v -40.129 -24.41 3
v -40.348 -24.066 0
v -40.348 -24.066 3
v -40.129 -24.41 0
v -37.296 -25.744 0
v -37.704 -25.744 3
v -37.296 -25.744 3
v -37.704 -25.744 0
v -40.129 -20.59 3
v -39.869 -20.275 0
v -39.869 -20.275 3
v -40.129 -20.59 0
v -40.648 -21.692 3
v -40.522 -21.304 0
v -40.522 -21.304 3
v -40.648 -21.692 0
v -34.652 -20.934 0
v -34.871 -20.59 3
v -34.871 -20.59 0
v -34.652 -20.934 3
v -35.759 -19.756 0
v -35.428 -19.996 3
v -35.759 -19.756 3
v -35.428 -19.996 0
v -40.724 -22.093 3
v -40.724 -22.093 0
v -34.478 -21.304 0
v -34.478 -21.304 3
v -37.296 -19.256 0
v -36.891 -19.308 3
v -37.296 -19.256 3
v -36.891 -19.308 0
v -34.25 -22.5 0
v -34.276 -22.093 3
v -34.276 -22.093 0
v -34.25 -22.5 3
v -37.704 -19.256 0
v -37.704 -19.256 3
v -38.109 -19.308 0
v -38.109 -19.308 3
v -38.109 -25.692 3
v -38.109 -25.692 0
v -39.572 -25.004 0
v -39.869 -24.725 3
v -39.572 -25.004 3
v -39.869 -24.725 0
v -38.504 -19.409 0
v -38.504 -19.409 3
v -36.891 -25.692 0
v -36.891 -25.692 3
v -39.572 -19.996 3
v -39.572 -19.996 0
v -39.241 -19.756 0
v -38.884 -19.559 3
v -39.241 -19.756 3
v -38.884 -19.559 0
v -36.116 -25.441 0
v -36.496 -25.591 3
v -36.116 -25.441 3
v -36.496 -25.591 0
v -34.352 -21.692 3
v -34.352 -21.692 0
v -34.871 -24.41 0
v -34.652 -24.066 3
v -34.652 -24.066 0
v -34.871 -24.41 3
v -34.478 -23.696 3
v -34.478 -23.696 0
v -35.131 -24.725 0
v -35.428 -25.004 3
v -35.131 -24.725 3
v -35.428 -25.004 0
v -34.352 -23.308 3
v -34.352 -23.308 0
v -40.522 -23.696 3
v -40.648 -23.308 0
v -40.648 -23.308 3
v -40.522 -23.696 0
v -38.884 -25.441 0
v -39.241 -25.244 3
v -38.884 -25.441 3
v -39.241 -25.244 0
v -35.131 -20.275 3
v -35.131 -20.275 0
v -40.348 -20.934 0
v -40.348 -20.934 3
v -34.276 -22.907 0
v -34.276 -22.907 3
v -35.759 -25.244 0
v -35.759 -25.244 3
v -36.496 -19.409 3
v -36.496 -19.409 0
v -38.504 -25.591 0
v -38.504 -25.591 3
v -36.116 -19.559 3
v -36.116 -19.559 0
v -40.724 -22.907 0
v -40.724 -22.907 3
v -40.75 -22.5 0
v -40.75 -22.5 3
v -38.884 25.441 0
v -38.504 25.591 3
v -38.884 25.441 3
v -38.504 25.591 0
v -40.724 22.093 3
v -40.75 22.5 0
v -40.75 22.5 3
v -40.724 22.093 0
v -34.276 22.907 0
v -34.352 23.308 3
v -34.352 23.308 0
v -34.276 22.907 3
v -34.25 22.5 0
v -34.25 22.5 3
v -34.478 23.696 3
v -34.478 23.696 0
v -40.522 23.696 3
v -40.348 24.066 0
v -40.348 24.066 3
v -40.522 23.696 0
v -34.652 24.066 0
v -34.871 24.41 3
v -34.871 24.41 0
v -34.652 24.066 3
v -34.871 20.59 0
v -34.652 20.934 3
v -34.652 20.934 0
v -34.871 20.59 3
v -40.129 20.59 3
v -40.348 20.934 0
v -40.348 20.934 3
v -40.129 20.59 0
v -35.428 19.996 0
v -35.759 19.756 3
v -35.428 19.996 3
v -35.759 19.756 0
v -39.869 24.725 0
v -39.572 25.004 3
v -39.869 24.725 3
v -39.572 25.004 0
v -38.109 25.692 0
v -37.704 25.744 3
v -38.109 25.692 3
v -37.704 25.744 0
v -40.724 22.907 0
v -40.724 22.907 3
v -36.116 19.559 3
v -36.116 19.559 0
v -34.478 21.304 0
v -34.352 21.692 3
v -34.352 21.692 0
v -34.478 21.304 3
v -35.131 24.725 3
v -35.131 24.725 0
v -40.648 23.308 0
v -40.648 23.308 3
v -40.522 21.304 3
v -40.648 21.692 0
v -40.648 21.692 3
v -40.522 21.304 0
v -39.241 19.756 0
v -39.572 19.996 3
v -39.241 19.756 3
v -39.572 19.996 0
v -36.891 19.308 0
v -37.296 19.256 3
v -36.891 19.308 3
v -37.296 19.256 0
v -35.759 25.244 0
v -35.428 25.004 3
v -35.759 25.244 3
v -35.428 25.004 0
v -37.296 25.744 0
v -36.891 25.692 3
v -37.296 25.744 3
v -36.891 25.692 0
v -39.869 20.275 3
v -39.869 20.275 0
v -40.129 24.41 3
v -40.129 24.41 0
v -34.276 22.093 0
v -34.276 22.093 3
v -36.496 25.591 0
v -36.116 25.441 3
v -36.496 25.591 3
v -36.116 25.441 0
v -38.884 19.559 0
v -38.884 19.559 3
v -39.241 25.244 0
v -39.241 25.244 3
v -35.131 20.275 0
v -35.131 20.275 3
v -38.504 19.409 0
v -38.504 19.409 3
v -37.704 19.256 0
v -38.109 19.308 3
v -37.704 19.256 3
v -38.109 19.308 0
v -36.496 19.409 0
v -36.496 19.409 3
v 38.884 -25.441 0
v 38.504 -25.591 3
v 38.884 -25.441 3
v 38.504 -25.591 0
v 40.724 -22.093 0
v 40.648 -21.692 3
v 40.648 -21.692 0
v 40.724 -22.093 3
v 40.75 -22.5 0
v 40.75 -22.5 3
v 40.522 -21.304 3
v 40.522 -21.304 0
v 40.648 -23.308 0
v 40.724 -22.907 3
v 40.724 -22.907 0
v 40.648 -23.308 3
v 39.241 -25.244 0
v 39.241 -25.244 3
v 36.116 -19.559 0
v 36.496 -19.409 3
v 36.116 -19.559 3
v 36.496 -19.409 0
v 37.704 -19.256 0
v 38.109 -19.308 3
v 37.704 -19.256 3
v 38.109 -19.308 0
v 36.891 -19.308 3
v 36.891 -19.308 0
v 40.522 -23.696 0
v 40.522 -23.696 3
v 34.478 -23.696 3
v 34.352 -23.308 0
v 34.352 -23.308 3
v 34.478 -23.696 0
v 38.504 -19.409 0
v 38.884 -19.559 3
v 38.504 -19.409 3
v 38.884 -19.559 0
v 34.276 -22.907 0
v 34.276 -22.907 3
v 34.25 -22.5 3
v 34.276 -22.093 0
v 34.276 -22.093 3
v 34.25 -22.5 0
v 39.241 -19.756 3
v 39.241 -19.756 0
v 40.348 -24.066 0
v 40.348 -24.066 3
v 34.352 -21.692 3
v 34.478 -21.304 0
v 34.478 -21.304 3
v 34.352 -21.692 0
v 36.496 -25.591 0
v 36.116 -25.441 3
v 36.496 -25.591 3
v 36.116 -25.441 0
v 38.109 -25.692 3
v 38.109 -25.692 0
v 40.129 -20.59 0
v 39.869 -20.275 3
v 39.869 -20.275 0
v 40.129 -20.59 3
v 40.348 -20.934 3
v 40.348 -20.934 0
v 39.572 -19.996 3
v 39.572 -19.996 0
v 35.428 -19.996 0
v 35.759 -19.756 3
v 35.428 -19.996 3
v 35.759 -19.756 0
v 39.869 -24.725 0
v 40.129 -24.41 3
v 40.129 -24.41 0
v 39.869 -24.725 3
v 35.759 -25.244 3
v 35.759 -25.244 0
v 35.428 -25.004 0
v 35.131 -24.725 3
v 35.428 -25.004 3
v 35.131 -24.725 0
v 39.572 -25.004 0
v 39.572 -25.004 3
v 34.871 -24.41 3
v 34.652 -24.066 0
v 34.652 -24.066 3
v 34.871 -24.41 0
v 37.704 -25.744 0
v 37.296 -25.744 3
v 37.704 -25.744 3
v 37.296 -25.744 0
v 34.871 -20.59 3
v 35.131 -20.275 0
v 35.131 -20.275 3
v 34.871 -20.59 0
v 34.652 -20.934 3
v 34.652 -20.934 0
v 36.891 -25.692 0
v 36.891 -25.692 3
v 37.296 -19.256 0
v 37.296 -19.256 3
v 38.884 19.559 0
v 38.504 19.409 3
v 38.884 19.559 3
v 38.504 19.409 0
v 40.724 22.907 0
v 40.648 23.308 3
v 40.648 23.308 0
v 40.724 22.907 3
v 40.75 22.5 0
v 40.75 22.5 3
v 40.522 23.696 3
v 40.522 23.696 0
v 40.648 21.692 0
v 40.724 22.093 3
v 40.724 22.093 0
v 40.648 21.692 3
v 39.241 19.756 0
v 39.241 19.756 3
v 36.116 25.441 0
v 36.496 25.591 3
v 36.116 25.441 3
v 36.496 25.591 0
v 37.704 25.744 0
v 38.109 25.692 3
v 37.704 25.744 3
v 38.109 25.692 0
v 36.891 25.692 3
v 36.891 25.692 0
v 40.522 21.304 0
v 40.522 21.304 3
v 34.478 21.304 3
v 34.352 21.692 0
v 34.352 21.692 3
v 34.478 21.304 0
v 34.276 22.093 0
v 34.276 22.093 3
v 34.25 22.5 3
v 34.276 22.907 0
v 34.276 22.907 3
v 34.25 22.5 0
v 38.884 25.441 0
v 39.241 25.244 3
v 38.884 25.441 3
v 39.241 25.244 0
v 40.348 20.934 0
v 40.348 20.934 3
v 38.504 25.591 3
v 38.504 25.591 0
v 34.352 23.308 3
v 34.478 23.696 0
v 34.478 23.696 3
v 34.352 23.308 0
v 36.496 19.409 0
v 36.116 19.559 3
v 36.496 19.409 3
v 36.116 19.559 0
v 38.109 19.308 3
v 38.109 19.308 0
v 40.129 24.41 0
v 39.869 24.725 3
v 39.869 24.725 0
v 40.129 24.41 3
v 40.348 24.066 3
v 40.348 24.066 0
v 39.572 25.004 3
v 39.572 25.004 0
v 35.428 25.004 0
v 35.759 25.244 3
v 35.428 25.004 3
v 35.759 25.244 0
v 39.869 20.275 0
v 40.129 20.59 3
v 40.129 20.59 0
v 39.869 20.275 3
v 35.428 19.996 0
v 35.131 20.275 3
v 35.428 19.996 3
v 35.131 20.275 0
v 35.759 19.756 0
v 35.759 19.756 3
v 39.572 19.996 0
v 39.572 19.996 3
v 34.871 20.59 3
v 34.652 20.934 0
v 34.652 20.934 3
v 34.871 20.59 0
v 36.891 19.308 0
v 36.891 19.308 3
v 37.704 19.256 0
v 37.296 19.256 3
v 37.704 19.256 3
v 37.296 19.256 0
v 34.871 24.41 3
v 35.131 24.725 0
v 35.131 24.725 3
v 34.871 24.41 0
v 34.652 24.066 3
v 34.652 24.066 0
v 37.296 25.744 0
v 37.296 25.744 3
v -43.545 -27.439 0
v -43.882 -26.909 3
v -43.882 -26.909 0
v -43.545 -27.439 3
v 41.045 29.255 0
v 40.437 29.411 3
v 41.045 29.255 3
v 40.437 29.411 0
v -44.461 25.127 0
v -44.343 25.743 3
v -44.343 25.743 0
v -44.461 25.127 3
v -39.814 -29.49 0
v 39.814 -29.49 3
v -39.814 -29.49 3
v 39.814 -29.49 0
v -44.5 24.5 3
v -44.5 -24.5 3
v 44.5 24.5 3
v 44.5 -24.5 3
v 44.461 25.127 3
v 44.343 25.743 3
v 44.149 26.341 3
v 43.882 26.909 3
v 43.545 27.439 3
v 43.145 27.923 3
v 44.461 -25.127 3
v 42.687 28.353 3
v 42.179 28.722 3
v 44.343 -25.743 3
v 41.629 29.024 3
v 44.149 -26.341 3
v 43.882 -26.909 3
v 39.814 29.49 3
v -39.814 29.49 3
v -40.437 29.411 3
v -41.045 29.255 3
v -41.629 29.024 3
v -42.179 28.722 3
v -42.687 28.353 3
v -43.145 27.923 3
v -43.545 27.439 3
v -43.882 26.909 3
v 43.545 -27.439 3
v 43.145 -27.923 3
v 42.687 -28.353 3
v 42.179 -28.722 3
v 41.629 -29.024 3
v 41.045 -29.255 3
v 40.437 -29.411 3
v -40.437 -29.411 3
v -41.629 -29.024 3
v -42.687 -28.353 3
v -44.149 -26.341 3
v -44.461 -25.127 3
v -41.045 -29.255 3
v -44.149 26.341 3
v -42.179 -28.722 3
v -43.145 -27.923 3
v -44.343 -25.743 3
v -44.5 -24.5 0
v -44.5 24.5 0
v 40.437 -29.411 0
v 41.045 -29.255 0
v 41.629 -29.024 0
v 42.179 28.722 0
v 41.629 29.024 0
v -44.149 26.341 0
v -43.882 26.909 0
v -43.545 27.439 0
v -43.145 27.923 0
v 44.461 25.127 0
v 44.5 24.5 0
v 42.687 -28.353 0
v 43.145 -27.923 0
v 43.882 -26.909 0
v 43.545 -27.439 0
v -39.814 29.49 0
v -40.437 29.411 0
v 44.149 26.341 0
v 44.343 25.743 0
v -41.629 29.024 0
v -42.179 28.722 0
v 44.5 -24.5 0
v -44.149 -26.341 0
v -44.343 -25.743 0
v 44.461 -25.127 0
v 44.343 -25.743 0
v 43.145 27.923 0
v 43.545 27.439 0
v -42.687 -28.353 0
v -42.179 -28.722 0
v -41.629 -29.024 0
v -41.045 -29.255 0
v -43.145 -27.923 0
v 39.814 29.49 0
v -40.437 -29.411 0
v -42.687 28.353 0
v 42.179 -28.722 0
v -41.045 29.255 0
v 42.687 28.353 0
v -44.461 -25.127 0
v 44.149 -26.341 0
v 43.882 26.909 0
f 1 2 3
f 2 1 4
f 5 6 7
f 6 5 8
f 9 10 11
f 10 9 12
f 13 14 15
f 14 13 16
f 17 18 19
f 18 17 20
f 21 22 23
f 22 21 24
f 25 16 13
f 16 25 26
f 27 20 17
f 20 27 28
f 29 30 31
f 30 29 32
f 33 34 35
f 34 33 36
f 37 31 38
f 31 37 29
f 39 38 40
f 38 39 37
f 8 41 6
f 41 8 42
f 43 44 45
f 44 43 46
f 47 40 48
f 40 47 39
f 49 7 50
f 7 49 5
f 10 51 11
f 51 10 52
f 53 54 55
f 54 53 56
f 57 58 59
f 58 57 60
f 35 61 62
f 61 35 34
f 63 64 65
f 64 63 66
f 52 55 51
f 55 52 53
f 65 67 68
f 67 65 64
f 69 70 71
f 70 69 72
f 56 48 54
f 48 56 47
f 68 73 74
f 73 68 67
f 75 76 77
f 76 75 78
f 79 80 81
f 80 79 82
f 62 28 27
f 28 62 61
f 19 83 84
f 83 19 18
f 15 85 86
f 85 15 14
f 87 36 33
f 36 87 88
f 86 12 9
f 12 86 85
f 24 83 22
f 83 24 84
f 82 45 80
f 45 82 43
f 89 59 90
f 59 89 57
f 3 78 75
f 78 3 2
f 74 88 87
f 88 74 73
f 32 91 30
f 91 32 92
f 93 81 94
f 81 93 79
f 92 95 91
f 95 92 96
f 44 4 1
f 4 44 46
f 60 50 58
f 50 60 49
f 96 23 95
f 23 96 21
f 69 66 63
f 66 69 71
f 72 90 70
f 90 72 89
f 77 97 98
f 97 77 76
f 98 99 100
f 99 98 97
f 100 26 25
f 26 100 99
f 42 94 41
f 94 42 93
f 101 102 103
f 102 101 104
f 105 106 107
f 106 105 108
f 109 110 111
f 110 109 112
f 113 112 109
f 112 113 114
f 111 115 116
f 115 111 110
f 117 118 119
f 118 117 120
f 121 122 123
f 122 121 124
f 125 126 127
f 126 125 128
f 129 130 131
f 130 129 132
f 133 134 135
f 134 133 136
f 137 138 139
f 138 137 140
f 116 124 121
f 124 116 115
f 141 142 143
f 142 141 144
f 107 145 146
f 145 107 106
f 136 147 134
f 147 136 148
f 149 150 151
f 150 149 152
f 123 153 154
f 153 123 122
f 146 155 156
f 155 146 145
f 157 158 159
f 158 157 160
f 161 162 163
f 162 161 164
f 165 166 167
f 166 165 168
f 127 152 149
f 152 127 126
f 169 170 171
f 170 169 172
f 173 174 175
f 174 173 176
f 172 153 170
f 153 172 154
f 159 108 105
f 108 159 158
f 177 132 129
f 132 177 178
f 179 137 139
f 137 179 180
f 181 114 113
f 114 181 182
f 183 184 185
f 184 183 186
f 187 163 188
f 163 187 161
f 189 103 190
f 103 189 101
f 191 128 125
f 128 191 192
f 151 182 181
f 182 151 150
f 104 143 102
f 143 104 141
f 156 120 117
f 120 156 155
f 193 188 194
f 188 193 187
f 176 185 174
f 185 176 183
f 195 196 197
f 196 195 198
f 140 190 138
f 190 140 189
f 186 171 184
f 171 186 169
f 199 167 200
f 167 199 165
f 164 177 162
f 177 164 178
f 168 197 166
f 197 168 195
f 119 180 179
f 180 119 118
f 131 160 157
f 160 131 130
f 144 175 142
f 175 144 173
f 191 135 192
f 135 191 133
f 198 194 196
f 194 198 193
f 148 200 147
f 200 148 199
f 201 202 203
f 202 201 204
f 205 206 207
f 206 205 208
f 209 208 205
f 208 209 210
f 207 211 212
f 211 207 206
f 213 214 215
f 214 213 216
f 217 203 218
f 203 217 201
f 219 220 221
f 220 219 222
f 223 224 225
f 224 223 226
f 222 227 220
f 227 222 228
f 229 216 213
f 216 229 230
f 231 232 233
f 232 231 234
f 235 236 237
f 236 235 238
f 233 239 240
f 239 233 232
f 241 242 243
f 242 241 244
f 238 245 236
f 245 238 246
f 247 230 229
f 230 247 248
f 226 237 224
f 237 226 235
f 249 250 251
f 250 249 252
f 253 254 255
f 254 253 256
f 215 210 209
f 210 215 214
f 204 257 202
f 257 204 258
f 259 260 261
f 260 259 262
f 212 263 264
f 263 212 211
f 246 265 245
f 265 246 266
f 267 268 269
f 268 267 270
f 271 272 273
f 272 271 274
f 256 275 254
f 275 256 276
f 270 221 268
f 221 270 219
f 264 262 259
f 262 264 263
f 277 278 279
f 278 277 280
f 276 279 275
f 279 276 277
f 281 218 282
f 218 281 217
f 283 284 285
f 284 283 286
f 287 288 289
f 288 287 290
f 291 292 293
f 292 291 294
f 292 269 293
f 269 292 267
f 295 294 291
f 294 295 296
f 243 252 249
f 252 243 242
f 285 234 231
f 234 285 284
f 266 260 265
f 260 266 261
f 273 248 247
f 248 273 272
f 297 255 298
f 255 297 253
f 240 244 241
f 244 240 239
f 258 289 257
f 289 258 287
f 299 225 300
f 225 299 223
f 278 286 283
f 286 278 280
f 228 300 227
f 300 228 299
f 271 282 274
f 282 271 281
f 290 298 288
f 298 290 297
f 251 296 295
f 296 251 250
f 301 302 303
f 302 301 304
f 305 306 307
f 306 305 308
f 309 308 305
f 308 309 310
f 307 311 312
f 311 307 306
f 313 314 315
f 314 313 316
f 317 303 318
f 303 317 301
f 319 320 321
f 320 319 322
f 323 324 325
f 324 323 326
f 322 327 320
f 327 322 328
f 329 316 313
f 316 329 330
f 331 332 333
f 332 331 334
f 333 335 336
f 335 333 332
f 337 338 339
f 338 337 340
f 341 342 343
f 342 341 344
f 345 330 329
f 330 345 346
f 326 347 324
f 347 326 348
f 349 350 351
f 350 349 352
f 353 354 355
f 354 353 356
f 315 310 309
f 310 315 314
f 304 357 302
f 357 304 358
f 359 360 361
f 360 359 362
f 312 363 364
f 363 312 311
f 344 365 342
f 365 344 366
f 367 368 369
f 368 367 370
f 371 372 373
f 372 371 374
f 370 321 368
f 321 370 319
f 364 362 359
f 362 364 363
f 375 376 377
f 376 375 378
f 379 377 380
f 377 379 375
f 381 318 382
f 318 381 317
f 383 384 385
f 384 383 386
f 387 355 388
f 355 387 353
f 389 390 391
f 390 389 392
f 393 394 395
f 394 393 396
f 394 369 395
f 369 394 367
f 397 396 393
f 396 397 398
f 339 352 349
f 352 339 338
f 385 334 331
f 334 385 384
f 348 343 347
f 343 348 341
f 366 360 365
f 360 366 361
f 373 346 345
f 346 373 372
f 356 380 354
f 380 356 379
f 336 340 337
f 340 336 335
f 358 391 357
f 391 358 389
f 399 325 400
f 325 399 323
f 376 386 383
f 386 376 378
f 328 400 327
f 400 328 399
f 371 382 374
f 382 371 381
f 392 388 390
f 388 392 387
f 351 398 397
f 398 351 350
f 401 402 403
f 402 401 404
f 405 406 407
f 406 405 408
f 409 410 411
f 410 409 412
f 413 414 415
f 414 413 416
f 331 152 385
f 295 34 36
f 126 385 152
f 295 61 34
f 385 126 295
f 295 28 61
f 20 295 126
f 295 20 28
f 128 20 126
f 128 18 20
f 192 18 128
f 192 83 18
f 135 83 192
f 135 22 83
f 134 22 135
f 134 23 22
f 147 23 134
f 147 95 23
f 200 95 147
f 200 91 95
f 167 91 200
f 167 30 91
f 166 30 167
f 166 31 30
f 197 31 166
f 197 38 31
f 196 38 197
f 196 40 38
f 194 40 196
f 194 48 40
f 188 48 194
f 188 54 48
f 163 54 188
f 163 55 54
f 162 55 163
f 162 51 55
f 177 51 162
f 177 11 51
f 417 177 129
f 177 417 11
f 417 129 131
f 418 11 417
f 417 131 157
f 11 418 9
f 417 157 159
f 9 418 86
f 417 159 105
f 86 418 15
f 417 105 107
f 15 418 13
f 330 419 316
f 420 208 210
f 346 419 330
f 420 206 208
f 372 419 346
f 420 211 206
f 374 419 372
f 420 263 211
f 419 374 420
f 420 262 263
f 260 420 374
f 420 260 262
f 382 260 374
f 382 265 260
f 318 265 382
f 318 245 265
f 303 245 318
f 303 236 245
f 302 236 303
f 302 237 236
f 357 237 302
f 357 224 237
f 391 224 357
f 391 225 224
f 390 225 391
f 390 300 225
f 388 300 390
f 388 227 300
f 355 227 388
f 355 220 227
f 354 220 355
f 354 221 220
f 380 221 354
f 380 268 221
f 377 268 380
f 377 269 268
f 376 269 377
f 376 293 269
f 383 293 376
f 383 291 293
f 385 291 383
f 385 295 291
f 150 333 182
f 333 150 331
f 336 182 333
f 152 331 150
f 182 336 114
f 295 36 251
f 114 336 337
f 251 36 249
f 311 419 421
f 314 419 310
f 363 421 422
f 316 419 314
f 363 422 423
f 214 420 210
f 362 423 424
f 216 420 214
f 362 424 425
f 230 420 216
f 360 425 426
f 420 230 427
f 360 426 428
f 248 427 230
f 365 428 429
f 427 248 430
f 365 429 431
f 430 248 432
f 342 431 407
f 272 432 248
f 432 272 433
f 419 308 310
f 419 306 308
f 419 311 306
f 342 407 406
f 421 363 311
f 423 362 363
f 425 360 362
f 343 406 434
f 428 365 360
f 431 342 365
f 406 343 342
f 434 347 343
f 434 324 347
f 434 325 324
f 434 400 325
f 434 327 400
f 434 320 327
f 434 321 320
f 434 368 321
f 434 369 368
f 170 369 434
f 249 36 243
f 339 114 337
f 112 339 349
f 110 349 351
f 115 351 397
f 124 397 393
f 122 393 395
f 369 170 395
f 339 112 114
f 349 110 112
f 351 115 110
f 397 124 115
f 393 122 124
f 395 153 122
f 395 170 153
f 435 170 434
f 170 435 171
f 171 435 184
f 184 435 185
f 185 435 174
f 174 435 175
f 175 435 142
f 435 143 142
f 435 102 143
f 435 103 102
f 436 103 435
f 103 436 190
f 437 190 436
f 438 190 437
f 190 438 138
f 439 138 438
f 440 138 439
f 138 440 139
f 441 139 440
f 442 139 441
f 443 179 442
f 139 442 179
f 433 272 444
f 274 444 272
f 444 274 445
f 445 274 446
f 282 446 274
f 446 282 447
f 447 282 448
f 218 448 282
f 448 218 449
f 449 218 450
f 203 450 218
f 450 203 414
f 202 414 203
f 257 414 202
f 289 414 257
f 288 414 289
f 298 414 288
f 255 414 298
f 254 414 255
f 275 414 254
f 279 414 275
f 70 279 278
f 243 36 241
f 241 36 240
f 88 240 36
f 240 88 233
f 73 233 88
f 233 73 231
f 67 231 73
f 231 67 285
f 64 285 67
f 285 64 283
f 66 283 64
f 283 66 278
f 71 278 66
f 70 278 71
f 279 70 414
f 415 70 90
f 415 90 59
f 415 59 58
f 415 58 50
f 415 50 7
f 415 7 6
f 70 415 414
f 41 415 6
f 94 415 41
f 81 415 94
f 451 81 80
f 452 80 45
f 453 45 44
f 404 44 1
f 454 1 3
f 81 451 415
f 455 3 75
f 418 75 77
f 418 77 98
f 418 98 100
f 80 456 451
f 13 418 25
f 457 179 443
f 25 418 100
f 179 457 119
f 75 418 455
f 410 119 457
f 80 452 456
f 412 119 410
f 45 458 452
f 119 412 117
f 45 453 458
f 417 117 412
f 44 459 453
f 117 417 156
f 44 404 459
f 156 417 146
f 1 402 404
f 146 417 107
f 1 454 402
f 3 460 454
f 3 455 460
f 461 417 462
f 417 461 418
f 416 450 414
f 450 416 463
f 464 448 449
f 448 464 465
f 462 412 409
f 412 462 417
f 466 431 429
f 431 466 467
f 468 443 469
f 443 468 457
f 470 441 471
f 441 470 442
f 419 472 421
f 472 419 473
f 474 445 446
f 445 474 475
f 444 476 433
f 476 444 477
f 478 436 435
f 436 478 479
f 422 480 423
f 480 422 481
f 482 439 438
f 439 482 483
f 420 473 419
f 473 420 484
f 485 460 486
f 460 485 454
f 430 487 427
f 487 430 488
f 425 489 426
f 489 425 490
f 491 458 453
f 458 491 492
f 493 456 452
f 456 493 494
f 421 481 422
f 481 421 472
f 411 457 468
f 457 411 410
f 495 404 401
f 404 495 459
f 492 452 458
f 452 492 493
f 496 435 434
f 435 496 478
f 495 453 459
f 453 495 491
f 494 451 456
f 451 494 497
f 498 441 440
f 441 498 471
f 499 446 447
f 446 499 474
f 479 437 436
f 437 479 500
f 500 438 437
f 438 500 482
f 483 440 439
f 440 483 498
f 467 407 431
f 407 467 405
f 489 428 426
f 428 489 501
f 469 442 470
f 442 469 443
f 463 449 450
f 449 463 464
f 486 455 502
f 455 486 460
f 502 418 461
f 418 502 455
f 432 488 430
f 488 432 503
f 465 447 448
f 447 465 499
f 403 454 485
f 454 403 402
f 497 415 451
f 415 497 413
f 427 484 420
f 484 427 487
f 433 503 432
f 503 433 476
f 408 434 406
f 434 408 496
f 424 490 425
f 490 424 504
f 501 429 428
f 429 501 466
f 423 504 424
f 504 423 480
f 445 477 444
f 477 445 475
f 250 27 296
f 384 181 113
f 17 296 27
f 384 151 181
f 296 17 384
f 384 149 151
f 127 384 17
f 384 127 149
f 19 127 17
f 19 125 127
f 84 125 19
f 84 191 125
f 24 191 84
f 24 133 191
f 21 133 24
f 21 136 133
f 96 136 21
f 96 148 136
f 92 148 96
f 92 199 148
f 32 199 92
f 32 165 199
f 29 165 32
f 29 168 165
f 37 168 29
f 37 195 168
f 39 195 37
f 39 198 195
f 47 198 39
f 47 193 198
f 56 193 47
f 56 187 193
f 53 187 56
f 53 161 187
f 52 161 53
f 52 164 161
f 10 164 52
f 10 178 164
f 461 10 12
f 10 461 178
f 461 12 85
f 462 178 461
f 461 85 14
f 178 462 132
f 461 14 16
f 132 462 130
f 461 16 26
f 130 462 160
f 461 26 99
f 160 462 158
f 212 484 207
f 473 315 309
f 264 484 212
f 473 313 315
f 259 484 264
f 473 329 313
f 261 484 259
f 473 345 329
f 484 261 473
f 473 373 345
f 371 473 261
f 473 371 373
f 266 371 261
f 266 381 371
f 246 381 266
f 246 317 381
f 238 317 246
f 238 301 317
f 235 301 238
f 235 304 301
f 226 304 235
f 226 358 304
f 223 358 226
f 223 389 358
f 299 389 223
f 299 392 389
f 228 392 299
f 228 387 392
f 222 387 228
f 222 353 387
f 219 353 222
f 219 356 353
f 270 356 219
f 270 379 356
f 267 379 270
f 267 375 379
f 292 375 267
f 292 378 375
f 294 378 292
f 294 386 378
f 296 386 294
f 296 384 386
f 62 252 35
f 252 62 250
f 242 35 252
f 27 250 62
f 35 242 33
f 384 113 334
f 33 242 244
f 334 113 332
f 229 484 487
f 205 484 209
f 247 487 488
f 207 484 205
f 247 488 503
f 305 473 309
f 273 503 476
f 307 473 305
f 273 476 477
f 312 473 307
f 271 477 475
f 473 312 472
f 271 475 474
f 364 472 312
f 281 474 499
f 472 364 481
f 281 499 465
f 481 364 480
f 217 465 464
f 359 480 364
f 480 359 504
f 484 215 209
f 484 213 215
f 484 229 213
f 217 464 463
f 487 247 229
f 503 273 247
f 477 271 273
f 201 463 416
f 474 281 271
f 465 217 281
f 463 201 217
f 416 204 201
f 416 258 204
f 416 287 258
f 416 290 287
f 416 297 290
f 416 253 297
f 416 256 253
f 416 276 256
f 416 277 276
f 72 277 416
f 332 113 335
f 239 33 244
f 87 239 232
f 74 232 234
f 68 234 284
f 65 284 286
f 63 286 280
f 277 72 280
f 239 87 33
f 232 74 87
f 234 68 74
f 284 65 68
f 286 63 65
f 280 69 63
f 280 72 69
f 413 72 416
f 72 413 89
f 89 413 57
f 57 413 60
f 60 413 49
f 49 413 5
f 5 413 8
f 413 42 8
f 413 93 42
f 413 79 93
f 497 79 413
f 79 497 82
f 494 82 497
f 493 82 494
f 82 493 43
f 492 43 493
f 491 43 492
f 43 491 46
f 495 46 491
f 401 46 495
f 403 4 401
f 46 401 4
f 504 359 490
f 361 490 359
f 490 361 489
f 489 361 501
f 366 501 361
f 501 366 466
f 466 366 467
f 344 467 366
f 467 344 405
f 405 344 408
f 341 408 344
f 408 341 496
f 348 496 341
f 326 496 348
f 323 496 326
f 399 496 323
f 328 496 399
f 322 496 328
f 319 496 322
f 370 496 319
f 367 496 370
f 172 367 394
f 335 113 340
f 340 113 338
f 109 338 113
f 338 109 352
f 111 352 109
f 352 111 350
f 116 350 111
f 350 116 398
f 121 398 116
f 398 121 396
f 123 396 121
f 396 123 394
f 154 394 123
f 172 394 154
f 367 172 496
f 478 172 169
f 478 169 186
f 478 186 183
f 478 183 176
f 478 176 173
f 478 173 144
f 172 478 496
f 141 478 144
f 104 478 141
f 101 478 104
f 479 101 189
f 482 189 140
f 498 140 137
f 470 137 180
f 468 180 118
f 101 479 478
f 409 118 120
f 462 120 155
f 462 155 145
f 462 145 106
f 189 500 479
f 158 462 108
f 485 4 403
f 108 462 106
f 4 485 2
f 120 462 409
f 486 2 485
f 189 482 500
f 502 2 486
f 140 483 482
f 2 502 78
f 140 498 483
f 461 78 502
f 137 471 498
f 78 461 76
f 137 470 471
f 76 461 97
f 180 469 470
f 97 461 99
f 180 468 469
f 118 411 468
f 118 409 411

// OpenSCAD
$fn = 50;


difference() {
	union() {
		hull() {
			translate(v = [-39.5000000000, 24.5000000000, 0]) {
				cylinder(h = 3, r = 5);
			}
			translate(v = [39.5000000000, 24.5000000000, 0]) {
				cylinder(h = 3, r = 5);
			}
			translate(v = [-39.5000000000, -24.5000000000, 0]) {
				cylinder(h = 3, r = 5);
			}
			translate(v = [39.5000000000, -24.5000000000, 0]) {
				cylinder(h = 3, r = 5);
			}
		}
	}
	union() {
		translate(v = [-37.5000000000, -22.5000000000, -100.0000000000]) {
			cylinder(h = 200, r = 3.2500000000);
		}
		translate(v = [-37.5000000000, 22.5000000000, -100.0000000000]) {
			cylinder(h = 200, r = 3.2500000000);
		}
		translate(v = [37.5000000000, -22.5000000000, -100.0000000000]) {
			cylinder(h = 200, r = 3.2500000000);
		}
		translate(v = [37.5000000000, 22.5000000000, -100.0000000000]) {
			cylinder(h = 200, r = 3.2500000000);
		}
	}
}
